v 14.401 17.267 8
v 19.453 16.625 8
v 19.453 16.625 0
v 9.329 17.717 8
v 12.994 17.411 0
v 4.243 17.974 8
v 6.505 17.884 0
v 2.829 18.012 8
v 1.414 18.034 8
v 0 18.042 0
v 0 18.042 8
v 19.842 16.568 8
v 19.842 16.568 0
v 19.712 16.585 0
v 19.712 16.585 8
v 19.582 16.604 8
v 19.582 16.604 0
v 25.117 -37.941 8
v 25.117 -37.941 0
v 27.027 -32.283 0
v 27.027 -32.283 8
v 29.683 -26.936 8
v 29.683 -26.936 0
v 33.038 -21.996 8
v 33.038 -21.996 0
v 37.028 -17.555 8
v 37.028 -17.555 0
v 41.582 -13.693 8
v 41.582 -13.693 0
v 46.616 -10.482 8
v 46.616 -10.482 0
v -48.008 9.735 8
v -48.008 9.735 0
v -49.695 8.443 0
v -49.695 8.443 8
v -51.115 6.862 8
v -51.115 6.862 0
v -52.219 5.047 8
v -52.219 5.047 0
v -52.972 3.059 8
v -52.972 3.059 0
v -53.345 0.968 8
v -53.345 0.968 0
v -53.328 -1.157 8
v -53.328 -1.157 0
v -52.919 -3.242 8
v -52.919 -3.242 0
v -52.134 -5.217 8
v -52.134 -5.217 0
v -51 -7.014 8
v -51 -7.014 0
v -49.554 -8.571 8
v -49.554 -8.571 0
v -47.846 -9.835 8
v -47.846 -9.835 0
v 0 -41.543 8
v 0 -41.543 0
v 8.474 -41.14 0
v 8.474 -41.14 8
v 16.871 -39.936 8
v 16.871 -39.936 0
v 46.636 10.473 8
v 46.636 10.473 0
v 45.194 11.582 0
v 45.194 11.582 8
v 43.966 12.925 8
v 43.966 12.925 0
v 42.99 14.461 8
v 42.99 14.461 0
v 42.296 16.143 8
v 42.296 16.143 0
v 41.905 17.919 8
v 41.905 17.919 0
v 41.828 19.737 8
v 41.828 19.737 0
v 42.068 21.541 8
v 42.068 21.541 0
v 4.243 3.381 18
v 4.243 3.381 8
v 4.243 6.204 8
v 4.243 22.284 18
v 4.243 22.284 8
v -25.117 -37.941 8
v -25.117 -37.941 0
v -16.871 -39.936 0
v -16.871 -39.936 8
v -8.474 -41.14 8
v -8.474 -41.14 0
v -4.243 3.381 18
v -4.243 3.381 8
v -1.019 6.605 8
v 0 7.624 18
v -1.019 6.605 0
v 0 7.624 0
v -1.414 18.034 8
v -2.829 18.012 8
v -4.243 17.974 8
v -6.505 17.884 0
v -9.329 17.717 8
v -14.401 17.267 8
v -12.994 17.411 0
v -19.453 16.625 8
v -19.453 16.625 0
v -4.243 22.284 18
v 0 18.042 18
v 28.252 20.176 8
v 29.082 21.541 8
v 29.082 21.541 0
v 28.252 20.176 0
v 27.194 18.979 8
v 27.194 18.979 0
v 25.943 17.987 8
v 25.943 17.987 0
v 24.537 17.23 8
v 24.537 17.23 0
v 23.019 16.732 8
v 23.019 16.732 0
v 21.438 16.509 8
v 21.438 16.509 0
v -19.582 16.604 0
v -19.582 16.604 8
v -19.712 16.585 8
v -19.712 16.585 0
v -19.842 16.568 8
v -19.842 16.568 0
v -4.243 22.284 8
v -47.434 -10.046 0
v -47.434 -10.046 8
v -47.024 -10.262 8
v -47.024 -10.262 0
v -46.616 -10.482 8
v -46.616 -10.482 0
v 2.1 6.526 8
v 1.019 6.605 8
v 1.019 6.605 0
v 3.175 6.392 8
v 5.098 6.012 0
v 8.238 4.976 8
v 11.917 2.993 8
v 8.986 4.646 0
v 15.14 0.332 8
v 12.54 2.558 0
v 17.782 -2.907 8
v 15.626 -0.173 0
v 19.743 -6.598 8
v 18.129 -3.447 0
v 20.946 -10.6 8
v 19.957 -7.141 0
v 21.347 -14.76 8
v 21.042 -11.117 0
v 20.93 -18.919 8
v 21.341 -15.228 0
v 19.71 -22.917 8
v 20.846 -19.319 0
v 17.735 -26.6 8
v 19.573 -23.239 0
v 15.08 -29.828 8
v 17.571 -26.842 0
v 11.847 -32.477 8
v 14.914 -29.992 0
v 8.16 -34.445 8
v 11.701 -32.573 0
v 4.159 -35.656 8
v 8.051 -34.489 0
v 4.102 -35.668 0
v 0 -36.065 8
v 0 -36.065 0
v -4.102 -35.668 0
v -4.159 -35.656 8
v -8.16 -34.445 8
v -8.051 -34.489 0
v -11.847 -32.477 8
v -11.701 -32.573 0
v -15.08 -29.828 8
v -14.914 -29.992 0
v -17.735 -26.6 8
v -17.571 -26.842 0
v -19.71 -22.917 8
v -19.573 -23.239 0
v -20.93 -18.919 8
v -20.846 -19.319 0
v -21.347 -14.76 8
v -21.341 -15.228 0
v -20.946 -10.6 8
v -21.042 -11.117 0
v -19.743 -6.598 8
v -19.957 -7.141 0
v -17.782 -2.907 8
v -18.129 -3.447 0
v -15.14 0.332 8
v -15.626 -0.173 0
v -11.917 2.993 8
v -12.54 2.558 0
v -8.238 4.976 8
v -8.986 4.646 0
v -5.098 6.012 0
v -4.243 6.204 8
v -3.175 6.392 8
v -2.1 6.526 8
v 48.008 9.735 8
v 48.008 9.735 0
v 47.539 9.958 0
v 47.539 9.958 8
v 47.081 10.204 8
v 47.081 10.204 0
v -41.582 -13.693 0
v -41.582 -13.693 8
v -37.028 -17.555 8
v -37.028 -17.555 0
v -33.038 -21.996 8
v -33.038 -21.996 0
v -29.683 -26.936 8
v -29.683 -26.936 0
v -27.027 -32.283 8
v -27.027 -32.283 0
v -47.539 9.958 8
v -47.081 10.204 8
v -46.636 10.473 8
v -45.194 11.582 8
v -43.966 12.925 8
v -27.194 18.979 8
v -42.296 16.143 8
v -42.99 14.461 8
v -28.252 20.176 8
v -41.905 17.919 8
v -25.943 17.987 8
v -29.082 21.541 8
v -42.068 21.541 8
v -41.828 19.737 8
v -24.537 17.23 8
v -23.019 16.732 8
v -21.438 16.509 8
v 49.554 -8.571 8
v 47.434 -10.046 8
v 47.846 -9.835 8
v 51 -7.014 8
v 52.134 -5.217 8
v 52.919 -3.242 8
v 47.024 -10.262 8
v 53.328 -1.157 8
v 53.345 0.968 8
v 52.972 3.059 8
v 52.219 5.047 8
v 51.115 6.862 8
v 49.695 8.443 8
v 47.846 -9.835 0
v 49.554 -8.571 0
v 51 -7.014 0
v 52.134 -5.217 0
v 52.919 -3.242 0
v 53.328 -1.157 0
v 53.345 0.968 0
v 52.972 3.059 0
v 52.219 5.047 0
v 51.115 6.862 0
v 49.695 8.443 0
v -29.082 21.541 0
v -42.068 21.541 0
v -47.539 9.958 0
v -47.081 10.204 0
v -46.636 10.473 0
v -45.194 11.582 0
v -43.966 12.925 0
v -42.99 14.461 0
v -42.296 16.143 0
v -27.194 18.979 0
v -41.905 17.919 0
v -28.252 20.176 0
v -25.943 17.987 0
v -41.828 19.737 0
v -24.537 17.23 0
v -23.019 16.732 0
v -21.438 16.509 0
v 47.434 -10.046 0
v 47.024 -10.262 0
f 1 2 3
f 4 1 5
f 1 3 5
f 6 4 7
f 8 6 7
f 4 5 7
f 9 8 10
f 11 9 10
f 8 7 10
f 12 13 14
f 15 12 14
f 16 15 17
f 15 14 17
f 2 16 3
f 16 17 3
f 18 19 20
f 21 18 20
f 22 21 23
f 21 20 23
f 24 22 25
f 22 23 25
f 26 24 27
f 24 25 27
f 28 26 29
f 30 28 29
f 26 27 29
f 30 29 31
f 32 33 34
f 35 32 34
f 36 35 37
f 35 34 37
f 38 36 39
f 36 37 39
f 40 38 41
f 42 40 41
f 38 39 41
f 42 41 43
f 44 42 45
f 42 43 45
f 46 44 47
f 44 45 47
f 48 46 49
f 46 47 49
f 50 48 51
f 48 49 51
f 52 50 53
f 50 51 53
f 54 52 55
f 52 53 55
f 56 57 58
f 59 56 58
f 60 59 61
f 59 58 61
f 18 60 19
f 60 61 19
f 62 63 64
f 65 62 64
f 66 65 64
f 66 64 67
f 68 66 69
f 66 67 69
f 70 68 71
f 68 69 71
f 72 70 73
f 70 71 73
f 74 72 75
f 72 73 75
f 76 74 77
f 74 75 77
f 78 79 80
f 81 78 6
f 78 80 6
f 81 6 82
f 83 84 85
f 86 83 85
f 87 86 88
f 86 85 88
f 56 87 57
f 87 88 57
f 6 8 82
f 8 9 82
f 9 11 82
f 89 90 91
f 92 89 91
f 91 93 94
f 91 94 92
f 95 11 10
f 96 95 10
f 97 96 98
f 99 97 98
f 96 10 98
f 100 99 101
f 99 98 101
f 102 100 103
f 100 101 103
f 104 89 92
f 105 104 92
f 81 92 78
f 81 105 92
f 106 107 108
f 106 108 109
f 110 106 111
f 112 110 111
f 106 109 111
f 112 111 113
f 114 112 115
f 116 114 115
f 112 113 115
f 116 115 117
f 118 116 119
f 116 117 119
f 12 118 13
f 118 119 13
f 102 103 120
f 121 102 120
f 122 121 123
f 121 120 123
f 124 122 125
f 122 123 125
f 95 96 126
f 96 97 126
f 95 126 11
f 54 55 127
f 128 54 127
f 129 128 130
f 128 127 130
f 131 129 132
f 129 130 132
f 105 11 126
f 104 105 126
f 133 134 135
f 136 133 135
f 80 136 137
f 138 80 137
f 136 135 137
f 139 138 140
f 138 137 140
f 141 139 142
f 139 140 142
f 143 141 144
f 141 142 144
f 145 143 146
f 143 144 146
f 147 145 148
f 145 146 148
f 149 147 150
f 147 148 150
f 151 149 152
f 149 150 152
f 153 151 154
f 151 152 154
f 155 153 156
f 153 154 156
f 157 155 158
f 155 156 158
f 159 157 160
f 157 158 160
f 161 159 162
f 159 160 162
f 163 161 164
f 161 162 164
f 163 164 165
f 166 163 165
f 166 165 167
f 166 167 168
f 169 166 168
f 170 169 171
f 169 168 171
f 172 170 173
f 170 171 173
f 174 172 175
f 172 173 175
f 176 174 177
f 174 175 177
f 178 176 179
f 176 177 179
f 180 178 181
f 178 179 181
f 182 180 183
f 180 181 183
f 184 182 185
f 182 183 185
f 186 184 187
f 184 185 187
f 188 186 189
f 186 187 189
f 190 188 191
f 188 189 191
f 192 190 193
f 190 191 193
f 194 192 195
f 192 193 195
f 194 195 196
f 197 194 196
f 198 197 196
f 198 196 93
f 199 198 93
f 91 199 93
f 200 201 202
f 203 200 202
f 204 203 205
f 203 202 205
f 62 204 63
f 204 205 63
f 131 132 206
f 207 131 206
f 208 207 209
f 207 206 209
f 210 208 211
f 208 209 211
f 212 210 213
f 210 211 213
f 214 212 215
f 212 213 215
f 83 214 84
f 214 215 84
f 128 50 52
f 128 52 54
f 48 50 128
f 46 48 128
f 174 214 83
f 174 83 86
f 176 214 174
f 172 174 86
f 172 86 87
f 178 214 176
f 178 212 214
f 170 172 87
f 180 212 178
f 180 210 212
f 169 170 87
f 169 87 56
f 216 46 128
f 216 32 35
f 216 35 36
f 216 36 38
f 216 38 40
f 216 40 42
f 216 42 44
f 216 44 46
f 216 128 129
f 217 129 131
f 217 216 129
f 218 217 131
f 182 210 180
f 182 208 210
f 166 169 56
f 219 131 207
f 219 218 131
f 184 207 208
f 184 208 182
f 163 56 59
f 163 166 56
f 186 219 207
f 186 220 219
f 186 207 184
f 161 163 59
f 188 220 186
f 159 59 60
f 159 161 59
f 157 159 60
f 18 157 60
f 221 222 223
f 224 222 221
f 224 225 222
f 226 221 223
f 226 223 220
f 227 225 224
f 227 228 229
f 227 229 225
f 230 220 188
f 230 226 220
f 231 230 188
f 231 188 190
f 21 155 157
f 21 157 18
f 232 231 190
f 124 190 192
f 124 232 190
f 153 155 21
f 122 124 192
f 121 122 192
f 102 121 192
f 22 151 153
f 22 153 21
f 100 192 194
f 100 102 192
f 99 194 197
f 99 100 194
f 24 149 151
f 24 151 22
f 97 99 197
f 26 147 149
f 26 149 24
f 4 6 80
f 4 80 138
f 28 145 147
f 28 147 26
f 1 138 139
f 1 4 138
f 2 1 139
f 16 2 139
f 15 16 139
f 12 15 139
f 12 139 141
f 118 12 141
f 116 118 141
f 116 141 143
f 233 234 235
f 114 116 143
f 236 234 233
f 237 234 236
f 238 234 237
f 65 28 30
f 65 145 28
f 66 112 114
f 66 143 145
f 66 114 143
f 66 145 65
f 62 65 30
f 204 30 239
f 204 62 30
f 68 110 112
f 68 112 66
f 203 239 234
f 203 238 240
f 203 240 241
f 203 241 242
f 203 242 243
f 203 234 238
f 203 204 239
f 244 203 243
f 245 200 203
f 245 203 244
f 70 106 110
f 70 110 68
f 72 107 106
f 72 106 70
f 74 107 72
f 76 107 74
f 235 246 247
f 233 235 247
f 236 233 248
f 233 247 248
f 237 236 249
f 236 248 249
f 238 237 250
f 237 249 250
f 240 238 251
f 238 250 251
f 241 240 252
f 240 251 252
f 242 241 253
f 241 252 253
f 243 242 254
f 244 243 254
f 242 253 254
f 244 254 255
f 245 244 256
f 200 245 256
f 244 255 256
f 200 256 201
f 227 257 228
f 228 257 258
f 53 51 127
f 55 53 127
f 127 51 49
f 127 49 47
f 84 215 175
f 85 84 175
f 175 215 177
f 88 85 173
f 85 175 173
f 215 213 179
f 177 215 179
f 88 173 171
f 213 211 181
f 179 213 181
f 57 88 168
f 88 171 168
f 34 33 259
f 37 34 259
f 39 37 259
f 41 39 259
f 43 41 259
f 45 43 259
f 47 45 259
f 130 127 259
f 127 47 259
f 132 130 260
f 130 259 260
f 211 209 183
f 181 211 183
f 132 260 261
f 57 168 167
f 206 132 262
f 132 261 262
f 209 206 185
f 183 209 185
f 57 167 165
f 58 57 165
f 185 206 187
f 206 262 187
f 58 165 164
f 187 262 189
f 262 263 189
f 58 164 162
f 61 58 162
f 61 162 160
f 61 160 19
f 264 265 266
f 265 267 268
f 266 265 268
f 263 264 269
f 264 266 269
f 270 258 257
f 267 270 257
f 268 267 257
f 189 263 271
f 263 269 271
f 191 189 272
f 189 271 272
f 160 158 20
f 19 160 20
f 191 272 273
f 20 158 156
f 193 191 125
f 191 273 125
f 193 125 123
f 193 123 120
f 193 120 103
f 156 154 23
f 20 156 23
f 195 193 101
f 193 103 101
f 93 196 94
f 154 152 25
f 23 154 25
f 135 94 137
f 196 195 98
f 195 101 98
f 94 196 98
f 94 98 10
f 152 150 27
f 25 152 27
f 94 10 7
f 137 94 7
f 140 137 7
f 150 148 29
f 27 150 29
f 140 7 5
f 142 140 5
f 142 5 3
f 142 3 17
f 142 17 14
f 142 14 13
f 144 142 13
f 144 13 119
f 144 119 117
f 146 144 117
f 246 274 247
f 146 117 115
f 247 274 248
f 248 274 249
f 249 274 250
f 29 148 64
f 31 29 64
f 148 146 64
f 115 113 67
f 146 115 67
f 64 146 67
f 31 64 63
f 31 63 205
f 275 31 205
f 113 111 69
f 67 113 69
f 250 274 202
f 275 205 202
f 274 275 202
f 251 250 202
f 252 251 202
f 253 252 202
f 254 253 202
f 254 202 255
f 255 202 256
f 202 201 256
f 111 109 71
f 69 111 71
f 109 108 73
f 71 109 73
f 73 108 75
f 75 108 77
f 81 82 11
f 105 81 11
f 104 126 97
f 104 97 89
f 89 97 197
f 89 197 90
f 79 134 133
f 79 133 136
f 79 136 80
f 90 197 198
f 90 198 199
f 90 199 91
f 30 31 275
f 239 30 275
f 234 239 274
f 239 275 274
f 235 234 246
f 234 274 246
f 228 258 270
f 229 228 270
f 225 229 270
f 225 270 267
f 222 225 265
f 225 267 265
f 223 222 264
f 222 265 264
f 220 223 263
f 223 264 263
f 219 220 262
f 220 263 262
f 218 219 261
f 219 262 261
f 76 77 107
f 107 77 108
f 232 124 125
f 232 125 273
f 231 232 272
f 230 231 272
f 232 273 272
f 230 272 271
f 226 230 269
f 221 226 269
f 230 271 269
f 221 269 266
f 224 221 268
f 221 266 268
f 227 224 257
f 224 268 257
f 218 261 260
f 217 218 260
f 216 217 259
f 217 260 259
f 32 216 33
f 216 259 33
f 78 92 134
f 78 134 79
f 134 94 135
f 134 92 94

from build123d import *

# Parameters (mm, degrees)
F1_DEPTH = 8
F3_DEPTH = 10
F5_DEPTH = 25


with BuildPart() as f1:
    # F0 (on Top) → F1 (new body)
    with BuildSketch(Plane.XY):
        with BuildLine():
            Line((42.068422, 21.54067), (29.081911, 21.54067))
            ThreePointArc((29.081911, 21.54067), (25.256656, 17.577108), (19.841552, 16.567634))
            ThreePointArc((19.841552, 16.567634), (19.64703, 16.594249), (19.453131, 16.62508))
            ThreePointArc((19.453131, 16.62508), (9.752315, 17.686936), (0, 18.041513))
            ThreePointArc((0, 18.041513), (-9.752315, 17.686936), (-19.453131, 16.62508))
            ThreePointArc((-19.453131, 16.62508), (-19.64703, 16.594249), (-19.841552, 16.567634))
            ThreePointArc((-19.841552, 16.567634), (-25.256656, 17.577108), (-29.081911, 21.54067))
            Line((-29.081911, 21.54067), (-42.068422, 21.54067))
            ThreePointArc((-42.068422, 21.54067), (-42.606666, 15.286638), (-46.635796, 10.473247))
            ThreePointArc((-46.635796, 10.473247), (-47.308086, 10.078485), (-48.007976, 9.735025))
            ThreePointArc((-48.007976, 9.735025), (-53.385548, -0.095187), (-47.845987, -9.835033))
            ThreePointArc((-47.845987, -9.835033), (-47.228549, -10.153727), (-46.616208, -10.482108))
            ThreePointArc((-46.616208, -10.482108), (-33.037563, -21.996435), (-25.116532, -37.940607))
            ThreePointArc((-25.116532, -37.940607), (-12.686785, -40.637885), (0, -41.543091))
            ThreePointArc((0, -41.543091), (12.686785, -40.637885), (25.116532, -37.940607))
            ThreePointArc((25.116532, -37.940607), (33.037563, -21.996435), (46.616208, -10.482108))
            ThreePointArc((46.616208, -10.482108), (47.228549, -10.153727), (47.845987, -9.835033))
            ThreePointArc((47.845987, -9.835033), (53.385548, -0.095187), (48.007976, 9.735025))
            ThreePointArc((48.007976, 9.735025), (47.308086, 10.078485), (46.635796, 10.473247))
            ThreePointArc((46.635796, 10.473247), (42.606666, 15.286638), (42.068422, 21.54067))
        make_face()
        with BuildLine():
            ThreePointArc((0, 6.629357), (21.347405, -14.718047), (0, -36.065452))
            ThreePointArc((0, -36.065452), (-21.347405, -14.718047), (0, 6.629357))
        make_face(mode=Mode.SUBTRACT)
    extrude(amount=F1_DEPTH)

    # F2 (on face) → F3 (join)
    with BuildSketch(Plane.XY.offset(8)):
        Polygon((-4.242641, 3.38141), (0, 7.624051), (4.242641, 3.38141), (4.242641, 22.284153), (0, 18.041513), (-4.242641, 22.284153), align=None)
    extrude(amount=F3_DEPTH)

    # F4 (on face) → F5 (cut)
    with BuildSketch(Plane.XY.offset(18)):
        Polygon((4.242641, 3.38141), (0, 7.624051), (-4.242641, 3.38141), align=None)
    extrude(amount=-F5_DEPTH, mode=Mode.SUBTRACT)


solid = f1.part
